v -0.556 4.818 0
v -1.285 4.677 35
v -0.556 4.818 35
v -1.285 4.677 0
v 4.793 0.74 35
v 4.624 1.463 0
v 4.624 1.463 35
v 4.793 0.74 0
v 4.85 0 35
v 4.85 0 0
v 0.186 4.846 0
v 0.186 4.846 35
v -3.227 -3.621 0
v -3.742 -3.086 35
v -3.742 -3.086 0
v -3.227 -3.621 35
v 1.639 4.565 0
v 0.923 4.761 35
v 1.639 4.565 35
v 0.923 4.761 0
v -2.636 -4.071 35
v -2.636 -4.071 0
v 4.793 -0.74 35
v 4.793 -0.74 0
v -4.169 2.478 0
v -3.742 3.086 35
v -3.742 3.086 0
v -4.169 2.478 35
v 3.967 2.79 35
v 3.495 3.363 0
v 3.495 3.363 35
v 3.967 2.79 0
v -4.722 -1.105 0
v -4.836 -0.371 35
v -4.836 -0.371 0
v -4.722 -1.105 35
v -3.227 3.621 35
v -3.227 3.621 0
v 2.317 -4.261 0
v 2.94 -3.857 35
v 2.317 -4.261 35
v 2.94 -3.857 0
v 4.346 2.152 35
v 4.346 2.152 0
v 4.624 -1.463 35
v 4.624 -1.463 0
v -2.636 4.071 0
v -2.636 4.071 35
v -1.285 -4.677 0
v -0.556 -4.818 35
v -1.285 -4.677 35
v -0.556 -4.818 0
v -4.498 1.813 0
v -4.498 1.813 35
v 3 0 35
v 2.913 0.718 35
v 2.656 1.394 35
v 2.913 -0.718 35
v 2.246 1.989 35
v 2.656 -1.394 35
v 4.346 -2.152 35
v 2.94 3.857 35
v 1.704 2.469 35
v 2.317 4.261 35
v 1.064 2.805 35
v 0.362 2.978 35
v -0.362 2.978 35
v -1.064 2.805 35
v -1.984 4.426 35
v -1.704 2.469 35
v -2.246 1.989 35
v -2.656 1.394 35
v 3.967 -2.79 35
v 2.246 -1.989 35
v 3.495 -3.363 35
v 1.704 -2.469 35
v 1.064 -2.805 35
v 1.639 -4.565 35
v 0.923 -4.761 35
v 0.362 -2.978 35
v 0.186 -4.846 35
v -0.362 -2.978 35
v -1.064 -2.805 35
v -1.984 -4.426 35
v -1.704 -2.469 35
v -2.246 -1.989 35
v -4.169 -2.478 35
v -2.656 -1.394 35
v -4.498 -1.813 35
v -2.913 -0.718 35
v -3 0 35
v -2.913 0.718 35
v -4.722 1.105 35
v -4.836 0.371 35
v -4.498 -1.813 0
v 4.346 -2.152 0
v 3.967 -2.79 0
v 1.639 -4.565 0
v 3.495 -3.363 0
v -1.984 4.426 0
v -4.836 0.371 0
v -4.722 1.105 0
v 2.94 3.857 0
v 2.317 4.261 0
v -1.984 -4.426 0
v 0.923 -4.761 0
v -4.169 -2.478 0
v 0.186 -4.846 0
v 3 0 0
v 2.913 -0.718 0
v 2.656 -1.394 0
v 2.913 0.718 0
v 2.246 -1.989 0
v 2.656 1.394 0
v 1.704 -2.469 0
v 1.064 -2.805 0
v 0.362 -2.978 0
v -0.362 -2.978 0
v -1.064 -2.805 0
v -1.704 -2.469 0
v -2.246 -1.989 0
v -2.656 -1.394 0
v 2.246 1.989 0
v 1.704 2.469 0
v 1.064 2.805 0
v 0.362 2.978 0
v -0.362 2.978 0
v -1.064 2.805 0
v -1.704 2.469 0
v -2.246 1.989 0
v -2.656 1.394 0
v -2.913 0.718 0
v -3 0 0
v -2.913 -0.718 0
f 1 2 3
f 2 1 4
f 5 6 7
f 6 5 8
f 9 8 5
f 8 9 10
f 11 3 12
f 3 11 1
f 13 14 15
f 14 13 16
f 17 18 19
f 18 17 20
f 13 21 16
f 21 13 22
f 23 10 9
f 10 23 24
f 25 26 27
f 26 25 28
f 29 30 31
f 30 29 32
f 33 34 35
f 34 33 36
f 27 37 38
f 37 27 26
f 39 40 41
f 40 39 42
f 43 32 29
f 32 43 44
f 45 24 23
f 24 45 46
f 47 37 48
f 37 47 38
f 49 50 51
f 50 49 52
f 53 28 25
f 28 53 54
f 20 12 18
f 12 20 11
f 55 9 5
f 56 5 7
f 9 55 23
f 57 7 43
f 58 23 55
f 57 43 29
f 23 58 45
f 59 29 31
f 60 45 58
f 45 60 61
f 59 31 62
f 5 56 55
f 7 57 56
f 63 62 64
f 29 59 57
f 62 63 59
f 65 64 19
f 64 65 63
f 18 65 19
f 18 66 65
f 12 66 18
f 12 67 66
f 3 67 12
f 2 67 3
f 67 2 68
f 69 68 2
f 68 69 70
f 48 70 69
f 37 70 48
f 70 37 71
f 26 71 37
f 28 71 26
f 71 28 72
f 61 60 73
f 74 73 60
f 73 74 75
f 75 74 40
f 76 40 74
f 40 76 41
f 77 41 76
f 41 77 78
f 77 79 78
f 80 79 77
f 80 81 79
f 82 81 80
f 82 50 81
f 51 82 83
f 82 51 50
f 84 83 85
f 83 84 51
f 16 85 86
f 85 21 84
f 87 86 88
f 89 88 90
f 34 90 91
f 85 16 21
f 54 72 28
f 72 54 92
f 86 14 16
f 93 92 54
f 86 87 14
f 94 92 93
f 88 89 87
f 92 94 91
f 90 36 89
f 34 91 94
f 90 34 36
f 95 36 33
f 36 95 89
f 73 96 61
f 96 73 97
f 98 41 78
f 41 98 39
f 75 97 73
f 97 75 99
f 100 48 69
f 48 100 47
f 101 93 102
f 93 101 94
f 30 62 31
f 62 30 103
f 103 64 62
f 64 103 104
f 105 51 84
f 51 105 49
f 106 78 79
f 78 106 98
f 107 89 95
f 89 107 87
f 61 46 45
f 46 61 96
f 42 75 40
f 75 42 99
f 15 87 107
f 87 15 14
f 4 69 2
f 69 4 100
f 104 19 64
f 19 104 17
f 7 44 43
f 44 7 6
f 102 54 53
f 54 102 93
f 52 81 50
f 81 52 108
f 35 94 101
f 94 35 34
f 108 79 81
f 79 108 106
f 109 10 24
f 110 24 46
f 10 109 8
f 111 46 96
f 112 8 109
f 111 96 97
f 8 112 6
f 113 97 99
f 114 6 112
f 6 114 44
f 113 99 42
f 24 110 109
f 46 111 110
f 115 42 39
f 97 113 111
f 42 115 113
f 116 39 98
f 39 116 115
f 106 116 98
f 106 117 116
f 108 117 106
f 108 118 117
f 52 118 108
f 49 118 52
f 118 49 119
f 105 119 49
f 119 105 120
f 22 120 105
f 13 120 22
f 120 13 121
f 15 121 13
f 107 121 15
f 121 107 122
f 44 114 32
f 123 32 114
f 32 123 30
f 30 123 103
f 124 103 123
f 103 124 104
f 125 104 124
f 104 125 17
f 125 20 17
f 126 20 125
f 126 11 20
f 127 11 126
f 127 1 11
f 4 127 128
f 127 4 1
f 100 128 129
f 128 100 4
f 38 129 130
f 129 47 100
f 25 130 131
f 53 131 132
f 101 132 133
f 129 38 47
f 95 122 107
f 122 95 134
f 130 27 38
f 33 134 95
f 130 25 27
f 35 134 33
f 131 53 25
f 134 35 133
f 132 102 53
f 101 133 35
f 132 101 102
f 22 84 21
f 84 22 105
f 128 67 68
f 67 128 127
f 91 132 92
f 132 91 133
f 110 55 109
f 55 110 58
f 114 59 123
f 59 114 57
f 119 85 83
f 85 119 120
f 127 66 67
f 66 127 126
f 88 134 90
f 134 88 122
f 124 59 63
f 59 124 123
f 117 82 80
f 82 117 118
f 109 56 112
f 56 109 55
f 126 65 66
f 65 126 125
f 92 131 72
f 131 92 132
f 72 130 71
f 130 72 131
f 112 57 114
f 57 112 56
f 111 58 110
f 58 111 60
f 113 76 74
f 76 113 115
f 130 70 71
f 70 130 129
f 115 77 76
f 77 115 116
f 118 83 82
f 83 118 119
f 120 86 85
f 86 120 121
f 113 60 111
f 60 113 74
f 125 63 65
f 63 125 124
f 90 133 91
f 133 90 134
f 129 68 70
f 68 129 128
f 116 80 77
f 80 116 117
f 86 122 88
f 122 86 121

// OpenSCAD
$fs=0.75;$fa=5;

MainAxeDiameter = 6;
SeparatorLength = 35;
SeparatorExternalDiamater = 10-0.3;


difference ()
	{
	cylinder ( r = SeparatorExternalDiamater/2, h=SeparatorLength );
	translate ([0,0,-0.01])
	cylinder ( r = MainAxeDiameter/2, , h=SeparatorLength + 0.02 );
	}
